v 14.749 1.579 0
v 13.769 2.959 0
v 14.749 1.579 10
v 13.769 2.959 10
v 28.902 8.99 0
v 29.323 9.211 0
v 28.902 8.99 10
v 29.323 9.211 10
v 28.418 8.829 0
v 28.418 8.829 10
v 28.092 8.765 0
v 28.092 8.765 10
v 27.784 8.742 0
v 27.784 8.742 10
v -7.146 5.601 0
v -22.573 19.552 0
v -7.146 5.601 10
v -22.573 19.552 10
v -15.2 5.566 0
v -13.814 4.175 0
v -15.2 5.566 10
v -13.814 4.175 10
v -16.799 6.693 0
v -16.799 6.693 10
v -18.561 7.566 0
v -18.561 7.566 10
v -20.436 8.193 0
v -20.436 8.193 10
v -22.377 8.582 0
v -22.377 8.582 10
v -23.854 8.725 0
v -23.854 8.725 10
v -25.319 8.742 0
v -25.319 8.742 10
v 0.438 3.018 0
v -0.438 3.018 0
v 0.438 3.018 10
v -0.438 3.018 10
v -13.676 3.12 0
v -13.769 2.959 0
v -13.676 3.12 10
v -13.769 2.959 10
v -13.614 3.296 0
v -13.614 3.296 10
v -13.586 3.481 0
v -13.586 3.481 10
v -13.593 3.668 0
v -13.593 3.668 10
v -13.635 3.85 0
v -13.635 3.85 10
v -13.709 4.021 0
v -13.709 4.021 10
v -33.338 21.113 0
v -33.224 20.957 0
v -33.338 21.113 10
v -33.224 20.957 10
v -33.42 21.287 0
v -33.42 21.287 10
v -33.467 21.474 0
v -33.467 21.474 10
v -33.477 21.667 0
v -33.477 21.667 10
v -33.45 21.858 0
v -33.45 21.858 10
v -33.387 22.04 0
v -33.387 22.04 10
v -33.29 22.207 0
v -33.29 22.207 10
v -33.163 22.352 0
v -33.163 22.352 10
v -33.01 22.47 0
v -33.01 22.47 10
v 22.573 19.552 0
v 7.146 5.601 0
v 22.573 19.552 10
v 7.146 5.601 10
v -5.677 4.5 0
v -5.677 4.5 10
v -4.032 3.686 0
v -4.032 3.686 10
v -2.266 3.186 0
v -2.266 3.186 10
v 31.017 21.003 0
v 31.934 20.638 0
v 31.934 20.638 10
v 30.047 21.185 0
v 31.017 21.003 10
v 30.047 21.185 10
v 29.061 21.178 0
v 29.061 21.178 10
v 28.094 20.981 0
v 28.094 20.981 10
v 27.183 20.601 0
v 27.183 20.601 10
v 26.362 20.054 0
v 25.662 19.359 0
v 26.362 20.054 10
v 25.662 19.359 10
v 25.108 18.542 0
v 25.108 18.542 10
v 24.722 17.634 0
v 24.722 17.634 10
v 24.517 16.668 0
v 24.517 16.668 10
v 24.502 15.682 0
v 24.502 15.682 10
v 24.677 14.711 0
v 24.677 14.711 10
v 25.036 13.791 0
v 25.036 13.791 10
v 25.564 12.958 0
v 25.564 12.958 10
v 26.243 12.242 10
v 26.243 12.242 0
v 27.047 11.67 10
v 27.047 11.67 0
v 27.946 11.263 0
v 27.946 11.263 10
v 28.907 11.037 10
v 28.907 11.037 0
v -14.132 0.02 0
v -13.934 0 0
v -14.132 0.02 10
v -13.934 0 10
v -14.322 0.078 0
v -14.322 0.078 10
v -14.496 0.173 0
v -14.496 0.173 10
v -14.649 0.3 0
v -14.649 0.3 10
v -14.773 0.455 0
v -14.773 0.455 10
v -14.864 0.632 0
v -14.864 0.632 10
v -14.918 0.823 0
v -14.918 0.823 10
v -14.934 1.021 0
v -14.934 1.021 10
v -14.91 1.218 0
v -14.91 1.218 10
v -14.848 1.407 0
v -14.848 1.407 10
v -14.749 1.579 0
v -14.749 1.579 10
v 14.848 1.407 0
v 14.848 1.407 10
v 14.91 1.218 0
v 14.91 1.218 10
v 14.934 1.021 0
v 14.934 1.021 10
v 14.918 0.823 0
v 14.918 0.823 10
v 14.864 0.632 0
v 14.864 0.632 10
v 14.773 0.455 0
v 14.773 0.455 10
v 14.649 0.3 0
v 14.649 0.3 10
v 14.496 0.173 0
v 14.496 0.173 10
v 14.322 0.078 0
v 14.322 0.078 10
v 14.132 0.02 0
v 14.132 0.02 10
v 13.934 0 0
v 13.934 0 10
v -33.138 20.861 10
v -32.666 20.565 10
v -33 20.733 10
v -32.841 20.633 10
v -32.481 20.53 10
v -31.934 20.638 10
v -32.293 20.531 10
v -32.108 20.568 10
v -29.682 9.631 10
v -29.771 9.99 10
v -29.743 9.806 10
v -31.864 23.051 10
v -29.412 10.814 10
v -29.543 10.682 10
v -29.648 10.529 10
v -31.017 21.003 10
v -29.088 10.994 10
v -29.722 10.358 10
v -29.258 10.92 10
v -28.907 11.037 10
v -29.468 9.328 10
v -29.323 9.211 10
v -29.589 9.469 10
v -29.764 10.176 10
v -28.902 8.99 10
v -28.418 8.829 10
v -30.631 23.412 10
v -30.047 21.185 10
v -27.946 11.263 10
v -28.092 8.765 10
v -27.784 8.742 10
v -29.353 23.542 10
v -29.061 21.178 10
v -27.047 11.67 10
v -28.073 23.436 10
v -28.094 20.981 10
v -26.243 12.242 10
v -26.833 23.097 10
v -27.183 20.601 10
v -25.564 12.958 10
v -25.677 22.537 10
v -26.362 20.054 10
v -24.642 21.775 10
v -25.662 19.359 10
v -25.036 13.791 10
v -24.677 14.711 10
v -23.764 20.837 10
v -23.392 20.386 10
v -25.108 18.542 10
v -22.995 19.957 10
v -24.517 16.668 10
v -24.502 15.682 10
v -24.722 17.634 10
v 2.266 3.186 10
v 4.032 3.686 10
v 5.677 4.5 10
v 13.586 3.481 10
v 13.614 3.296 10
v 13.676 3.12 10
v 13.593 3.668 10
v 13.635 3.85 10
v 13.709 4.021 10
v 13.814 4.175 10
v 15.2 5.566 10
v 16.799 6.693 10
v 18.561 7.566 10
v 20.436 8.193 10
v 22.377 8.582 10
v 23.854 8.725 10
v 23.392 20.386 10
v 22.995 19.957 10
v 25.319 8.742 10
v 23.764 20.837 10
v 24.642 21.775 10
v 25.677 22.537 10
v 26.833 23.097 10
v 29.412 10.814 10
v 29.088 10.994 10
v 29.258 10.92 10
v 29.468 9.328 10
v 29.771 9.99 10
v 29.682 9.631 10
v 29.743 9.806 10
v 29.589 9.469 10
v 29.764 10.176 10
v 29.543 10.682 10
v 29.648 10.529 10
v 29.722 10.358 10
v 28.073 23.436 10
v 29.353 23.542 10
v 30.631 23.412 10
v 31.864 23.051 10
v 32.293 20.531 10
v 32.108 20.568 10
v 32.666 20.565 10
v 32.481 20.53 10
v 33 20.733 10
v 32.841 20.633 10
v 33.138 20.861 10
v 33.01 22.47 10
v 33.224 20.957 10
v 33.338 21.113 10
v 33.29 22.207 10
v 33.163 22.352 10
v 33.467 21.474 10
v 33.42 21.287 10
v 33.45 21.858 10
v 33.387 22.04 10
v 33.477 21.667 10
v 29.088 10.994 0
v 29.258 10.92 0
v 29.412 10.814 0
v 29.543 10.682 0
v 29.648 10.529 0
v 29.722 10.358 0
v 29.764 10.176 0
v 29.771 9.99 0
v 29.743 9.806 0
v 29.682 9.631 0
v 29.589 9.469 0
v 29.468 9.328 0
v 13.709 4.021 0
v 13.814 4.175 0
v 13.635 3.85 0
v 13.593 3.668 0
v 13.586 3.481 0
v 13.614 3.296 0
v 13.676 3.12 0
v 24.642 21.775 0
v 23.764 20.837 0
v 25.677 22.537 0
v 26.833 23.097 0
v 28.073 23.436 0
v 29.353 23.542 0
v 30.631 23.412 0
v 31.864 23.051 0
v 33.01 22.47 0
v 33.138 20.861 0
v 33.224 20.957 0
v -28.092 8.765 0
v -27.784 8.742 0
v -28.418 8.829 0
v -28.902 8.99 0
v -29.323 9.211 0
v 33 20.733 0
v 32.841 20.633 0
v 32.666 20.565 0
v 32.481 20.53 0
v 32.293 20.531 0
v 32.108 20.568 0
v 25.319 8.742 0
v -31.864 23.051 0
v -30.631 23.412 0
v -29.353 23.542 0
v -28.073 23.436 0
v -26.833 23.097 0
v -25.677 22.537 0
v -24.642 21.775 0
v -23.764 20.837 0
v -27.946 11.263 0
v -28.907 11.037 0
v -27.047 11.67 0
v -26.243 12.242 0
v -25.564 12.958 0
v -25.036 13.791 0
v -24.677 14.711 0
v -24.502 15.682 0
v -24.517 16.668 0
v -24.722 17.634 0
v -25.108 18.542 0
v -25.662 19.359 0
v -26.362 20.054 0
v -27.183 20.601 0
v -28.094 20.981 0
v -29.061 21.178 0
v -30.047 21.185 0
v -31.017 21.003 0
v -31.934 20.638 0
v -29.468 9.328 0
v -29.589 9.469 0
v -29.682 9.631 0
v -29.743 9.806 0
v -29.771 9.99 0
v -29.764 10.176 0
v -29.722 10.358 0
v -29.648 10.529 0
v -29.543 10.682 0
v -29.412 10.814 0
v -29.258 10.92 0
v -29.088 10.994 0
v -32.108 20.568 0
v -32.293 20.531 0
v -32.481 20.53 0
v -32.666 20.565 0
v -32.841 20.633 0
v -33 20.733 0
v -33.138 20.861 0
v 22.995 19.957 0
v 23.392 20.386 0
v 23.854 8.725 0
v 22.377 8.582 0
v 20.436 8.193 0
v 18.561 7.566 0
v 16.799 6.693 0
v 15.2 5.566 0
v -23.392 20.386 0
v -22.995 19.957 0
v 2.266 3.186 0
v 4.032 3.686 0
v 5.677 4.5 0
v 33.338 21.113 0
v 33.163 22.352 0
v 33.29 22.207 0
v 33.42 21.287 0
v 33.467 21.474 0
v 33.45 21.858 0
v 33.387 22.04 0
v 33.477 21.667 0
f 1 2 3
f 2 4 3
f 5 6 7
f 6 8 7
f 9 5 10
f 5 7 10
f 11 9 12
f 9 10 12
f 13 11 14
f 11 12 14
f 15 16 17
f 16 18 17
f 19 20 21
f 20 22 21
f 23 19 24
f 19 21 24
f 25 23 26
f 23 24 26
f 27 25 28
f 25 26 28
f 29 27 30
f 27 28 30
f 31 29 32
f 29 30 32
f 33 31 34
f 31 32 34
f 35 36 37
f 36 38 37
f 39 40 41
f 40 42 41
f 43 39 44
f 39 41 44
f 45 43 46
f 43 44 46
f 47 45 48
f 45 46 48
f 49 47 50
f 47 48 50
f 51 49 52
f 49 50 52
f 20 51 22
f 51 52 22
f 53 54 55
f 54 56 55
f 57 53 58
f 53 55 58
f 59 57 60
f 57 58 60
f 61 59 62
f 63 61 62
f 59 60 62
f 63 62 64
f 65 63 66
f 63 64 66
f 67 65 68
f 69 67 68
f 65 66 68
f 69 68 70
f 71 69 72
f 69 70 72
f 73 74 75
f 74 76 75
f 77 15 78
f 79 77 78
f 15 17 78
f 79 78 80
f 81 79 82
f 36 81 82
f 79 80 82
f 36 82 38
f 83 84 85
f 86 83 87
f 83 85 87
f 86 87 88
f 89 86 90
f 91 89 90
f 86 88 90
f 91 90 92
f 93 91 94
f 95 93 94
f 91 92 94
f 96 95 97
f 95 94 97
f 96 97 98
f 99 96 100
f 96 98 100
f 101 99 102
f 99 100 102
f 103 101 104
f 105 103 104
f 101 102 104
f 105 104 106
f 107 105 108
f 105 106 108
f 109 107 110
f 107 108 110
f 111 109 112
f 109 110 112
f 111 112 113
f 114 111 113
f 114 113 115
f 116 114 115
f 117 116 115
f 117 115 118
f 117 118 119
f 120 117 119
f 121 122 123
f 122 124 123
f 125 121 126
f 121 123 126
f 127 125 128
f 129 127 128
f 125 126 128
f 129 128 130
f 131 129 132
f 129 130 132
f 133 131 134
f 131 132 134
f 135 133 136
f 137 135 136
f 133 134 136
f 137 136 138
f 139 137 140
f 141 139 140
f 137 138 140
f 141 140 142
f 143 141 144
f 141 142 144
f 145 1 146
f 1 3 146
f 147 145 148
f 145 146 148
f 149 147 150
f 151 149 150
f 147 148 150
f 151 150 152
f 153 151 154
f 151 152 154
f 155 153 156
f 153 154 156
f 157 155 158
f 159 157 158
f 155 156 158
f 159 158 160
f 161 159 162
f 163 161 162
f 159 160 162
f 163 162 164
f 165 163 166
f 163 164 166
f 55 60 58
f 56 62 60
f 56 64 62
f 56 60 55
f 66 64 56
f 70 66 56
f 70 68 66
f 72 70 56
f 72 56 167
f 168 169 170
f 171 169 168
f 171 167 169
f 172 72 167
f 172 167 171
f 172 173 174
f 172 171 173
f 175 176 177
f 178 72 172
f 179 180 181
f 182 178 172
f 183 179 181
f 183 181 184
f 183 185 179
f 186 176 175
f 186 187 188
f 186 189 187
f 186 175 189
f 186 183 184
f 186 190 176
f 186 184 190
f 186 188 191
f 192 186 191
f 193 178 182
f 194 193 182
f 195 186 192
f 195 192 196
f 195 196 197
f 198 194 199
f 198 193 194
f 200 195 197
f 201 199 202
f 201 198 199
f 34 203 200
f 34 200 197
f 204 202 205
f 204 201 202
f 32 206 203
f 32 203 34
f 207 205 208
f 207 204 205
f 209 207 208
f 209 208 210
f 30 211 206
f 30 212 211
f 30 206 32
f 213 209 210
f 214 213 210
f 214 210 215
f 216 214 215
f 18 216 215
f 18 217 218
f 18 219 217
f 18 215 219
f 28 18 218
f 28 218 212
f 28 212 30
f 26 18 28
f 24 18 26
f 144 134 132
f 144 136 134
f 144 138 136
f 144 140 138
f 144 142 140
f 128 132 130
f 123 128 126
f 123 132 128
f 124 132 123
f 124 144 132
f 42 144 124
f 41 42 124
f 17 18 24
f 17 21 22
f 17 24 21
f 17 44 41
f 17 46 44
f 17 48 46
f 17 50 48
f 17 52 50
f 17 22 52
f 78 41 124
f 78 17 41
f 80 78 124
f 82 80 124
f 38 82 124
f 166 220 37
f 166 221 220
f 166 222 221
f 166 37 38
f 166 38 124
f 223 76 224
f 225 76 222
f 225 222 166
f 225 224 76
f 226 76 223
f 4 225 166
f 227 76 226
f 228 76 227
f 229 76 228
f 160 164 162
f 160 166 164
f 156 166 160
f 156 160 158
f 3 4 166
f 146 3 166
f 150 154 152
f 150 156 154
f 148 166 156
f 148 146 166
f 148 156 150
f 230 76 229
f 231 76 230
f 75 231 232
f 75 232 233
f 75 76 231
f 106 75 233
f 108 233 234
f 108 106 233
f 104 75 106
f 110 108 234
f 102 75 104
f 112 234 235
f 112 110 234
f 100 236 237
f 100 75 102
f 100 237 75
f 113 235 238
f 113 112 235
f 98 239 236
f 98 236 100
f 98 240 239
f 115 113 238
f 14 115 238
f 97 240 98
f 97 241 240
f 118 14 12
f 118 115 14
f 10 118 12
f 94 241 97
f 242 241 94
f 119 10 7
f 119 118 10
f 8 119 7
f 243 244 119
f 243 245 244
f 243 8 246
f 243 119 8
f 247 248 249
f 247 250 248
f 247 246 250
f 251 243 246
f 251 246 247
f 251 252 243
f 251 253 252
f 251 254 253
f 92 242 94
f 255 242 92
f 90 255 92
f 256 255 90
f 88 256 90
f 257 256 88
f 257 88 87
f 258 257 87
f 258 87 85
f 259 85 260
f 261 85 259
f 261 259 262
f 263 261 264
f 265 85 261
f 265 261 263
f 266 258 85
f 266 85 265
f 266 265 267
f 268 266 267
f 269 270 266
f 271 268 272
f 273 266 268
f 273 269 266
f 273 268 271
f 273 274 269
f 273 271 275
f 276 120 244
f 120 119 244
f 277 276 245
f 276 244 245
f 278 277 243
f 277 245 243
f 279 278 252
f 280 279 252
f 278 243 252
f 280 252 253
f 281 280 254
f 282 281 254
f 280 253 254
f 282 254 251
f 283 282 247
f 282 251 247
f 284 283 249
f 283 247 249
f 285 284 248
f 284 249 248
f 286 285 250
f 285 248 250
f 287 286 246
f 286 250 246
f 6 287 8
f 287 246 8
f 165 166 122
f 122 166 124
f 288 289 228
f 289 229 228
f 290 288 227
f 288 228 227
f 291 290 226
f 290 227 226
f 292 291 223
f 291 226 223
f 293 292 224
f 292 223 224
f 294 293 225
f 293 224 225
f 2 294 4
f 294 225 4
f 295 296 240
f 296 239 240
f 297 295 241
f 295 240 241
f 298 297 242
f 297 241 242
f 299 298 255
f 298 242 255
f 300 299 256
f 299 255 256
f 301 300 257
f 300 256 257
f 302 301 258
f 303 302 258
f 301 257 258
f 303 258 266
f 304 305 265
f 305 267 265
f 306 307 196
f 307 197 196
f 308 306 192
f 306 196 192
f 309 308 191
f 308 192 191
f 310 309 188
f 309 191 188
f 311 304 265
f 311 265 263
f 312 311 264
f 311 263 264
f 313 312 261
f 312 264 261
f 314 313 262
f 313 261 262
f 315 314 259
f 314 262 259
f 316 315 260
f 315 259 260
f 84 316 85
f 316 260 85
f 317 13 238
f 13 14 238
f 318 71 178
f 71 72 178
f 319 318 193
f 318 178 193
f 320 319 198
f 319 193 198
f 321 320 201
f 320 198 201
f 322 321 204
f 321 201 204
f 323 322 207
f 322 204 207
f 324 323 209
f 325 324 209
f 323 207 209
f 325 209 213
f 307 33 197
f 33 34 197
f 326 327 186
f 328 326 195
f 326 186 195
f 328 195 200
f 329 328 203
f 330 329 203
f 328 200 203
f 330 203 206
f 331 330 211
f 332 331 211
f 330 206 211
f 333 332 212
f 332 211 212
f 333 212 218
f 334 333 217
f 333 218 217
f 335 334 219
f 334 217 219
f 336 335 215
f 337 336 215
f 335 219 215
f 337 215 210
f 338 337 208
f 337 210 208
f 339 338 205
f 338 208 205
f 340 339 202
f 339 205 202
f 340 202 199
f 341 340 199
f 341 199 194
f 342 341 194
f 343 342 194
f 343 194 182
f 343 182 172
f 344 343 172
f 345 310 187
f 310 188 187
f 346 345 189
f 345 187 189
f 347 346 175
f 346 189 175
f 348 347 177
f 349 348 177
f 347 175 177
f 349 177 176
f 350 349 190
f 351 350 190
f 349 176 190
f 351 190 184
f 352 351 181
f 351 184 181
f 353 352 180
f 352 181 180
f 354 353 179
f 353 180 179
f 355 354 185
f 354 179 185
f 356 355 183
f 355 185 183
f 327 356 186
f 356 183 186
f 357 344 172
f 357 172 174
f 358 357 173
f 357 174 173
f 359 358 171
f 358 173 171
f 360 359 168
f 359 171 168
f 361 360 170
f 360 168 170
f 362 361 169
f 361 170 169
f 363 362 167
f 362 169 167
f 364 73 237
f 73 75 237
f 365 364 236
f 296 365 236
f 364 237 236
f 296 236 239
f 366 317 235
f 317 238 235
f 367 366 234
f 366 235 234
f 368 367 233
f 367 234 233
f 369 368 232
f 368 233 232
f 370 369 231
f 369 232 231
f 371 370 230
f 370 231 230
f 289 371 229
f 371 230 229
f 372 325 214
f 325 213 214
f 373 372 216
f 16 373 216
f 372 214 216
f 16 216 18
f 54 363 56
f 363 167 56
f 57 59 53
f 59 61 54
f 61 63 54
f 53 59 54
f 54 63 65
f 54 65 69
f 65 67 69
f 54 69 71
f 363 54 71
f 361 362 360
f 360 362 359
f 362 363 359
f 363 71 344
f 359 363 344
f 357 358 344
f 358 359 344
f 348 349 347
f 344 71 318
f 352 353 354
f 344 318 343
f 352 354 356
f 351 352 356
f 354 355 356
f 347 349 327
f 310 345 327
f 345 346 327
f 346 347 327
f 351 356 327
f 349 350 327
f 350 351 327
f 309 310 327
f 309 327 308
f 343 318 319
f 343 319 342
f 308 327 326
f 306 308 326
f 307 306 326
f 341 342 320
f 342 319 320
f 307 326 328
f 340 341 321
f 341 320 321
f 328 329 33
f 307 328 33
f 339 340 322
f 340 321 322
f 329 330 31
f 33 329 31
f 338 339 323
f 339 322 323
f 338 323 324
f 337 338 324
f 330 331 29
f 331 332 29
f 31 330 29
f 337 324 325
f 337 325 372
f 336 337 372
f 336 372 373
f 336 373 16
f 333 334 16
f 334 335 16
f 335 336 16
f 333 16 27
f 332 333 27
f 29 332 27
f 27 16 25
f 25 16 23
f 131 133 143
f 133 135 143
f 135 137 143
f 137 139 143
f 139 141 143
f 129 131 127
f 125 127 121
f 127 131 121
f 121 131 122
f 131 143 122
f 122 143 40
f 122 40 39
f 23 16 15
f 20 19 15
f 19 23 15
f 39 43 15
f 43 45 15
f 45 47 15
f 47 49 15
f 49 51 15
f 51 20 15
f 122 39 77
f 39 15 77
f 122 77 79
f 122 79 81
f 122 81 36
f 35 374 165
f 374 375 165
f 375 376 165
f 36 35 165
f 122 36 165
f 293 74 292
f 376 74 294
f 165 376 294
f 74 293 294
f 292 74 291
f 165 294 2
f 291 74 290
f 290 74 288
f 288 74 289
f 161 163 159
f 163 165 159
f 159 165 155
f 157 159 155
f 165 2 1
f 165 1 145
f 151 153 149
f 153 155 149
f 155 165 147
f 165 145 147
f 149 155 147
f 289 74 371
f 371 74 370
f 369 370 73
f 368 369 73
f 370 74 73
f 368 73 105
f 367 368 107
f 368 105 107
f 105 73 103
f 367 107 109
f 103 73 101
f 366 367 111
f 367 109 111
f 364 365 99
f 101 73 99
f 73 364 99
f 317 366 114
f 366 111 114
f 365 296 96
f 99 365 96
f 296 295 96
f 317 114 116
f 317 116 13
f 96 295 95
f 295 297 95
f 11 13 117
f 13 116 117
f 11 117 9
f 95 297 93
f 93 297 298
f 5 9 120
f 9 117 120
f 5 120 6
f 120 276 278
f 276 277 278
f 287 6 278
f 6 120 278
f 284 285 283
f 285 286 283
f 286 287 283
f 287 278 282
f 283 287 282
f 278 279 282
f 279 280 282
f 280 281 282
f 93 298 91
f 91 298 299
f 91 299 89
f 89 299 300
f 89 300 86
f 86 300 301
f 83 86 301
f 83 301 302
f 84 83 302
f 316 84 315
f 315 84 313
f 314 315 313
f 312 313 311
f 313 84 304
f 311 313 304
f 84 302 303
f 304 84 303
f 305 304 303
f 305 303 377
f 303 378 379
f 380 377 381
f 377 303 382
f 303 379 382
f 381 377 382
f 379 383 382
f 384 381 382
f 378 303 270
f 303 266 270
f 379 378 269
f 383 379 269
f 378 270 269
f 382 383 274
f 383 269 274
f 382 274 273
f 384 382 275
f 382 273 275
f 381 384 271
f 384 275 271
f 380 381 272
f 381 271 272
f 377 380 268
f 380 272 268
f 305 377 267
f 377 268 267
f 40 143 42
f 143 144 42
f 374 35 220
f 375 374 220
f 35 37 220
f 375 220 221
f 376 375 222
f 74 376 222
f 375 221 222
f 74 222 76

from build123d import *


with BuildPart() as part:
    # Sketch1 → Loft2 section 0
    with BuildSketch(Plane.XY):
        with BuildLine():
            Line((-14.749435925, 1.579146396), (-13.769485327, 2.95855378))
            ThreePointArc((-13.769485327, 2.95855378), (-13.585390404, 3.574613199), (-13.814433877, 4.175412031))
            add(Edge.make_bspline(
                [(-13.814433877, 4.175412031), (-14.417527952, 4.903873153), (-17.567781248, 7.791225194), (-22.06162275, 8.841915434), (-25.318719368, 8.741869045)],
                knots=[0.056598746, 0.056598746, 0.056598746, 0.056598746, 0.264504946, 1, 1, 1, 1], degree=3))
            Line((-25.318719368, 8.741869045), (-27.784310983, 8.741869045))
            add(Edge.make_bspline(
                [(-29.323229714, 9.211162218), (-28.911734347, 8.939401458), (-28.272403474, 8.743384076), (-27.784310983, 8.741869045)],
                knots=[0.586596628, 0.586596628, 0.586596628, 0.586596628, 1, 1, 1, 1], degree=3))
            ThreePointArc((-29.323229714, 9.211162218), (-29.747065132, 10.268151444), (-28.906559125, 11.036534382))
            ThreePointArc((-28.906559125, 11.036534382), (-24.721817141, 17.633736944), (-31.933702711, 20.637709922))
            ThreePointArc((-31.933702711, 20.637709922), (-32.573936169, 20.54323377), (-33.137949221, 20.860588307))
            Line((-33.137949221, 20.860588307), (-33.224181658, 20.957186689))
            ThreePointArc((-33.224181658, 20.957186689), (-33.468334903, 21.763124392), (-33.010324904, 22.46978784))
            ThreePointArc((-33.010324904, 22.46978784), (-28.072687528, 23.43565364), (-23.764465571, 20.837118829))
            ThreePointArc((-23.764465571, 20.837118829), (-23.196744837, 20.168506773), (-22.572618747, 19.552215012))
            Line((-22.572618747, 19.552215012), (-7.145865193, 5.601063972))
            ThreePointArc((-7.145865193, 5.601063972), (-4.032245088, 3.686045747), (-0.43842089, 3.017949499))
            Line((-0.43842089, 3.017949499), (0.43842089, 3.017949499))
            ThreePointArc((0.43842089, 3.017949499), (4.032245088, 3.686045747), (7.145865193, 5.601063972))
            Line((7.145865193, 5.601063972), (22.572618747, 19.552215012))
            ThreePointArc((22.572618747, 19.552215012), (23.196744837, 20.168506773), (23.764465571, 20.837118829))
            ThreePointArc((23.764465571, 20.837118829), (28.072687528, 23.43565364), (33.010324904, 22.46978784))
            ThreePointArc((33.010324904, 22.46978784), (33.468334903, 21.763124392), (33.224181658, 20.957186689))
            Line((33.224181658, 20.957186689), (33.137949221, 20.860588307))
            ThreePointArc((33.137949221, 20.860588307), (32.573936169, 20.54323377), (31.933702711, 20.637709922))
            ThreePointArc((31.933702711, 20.637709922), (24.721817141, 17.633736944), (28.906559125, 11.036534382))
            ThreePointArc((28.906559125, 11.036534382), (29.747065132, 10.268151444), (29.323229714, 9.211162218))
            add(Edge.make_bspline(
                [(29.323229714, 9.211162218), (28.911734347, 8.939401458), (28.272403474, 8.743384076), (27.784310983, 8.741869045)],
                knots=[0.586596628, 0.586596628, 0.586596628, 0.586596628, 1, 1, 1, 1], degree=3))
            Line((27.784310983, 8.741869045), (25.318719368, 8.741869045))
            add(Edge.make_bspline(
                [(13.814433877, 4.175412031), (14.417527952, 4.903873153), (17.567781248, 7.791225194), (22.06162275, 8.841915434), (25.318719368, 8.741869045)],
                knots=[0.056598746, 0.056598746, 0.056598746, 0.056598746, 0.264504946, 1, 1, 1, 1], degree=3))
            ThreePointArc((13.814433877, 4.175412031), (13.585390404, 3.574613199), (13.769485327, 2.95855378))
            Line((13.769485327, 2.95855378), (14.749435925, 1.579146396))
            ThreePointArc((14.749435925, 1.579146396), (14.822791679, 0.541276988), (13.934212365, 0))
            Line((13.934212365, 0), (-13.934212365, 0))
            ThreePointArc((-13.934212365, 0), (-14.822791679, 0.541276988), (-14.749435925, 1.579146396))
        make_face()
    # Sketch7 → Loft2 section 1
    with BuildSketch(Plane.XY.offset(10)):
        with BuildLine():
            Line((-14.749435925, 1.579146396), (-13.769485327, 2.95855378))
            ThreePointArc((-13.769485327, 2.95855378), (-13.585390404, 3.574613199), (-13.814433877, 4.175412031))
            add(Edge.make_bspline(
                [(-13.814433877, 4.175412031), (-14.417527952, 4.903873153), (-17.567781248, 7.791225194), (-22.06162275, 8.841915434), (-25.318719368, 8.741869045)],
                knots=[0.056598746, 0.056598746, 0.056598746, 0.056598746, 0.264504946, 1, 1, 1, 1], degree=3))
            Line((-25.318719368, 8.741869045), (-27.784310983, 8.741869045))
            add(Edge.make_bspline(
                [(-29.323229714, 9.211162218), (-28.911734347, 8.939401458), (-28.272403474, 8.743384076), (-27.784310983, 8.741869045)],
                knots=[0.586596628, 0.586596628, 0.586596628, 0.586596628, 1, 1, 1, 1], degree=3))
            ThreePointArc((-29.323229714, 9.211162218), (-29.747065132, 10.268151444), (-28.906559125, 11.036534382))
            ThreePointArc((-28.906559125, 11.036534382), (-24.721817141, 17.633736944), (-31.933702711, 20.637709922))
            ThreePointArc((-31.933702711, 20.637709922), (-32.573936169, 20.54323377), (-33.137949221, 20.860588307))
            Line((-33.137949221, 20.860588307), (-33.224181658, 20.957186689))
            ThreePointArc((-33.224181658, 20.957186689), (-33.468334903, 21.763124392), (-33.010324904, 22.46978784))
            ThreePointArc((-33.010324904, 22.46978784), (-28.072687528, 23.43565364), (-23.764465571, 20.837118829))
            ThreePointArc((-23.764465571, 20.837118829), (-23.196744837, 20.168506773), (-22.572618747, 19.552215012))
            Line((-22.572618747, 19.552215012), (-7.145865193, 5.601063972))
            ThreePointArc((-7.145865193, 5.601063972), (-4.032245088, 3.686045747), (-0.43842089, 3.017949499))
            Line((-0.43842089, 3.017949499), (0.43842089, 3.017949499))
            ThreePointArc((0.43842089, 3.017949499), (4.032245088, 3.686045747), (7.145865193, 5.601063972))
            Line((7.145865193, 5.601063972), (22.572618747, 19.552215012))
            ThreePointArc((22.572618747, 19.552215012), (23.196744837, 20.168506773), (23.764465571, 20.837118829))
            ThreePointArc((23.764465571, 20.837118829), (28.072687528, 23.43565364), (33.010324904, 22.46978784))
            ThreePointArc((33.010324904, 22.46978784), (33.468334903, 21.763124392), (33.224181658, 20.957186689))
            Line((33.224181658, 20.957186689), (33.137949221, 20.860588307))
            ThreePointArc((33.137949221, 20.860588307), (32.573936169, 20.54323377), (31.933702711, 20.637709922))
            ThreePointArc((31.933702711, 20.637709922), (24.721817141, 17.633736944), (28.906559125, 11.036534382))
            ThreePointArc((28.906559125, 11.036534382), (29.747065132, 10.268151444), (29.323229714, 9.211162218))
            add(Edge.make_bspline(
                [(29.323229714, 9.211162218), (28.911734347, 8.939401458), (28.272403474, 8.743384076), (27.784310983, 8.741869045)],
                knots=[0.586596628, 0.586596628, 0.586596628, 0.586596628, 1, 1, 1, 1], degree=3))
            Line((27.784310983, 8.741869045), (25.318719368, 8.741869045))
            add(Edge.make_bspline(
                [(13.814433877, 4.175412031), (14.417527952, 4.903873153), (17.567781248, 7.791225194), (22.06162275, 8.841915434), (25.318719368, 8.741869045)],
                knots=[0.056598746, 0.056598746, 0.056598746, 0.056598746, 0.264504946, 1, 1, 1, 1], degree=3))
            ThreePointArc((13.814433877, 4.175412031), (13.585390404, 3.574613199), (13.769485327, 2.95855378))
            Line((13.769485327, 2.95855378), (14.749435925, 1.579146396))
            ThreePointArc((14.749435925, 1.579146396), (14.822791679, 0.541276988), (13.934212365, 0))
            Line((13.934212365, 0), (-13.934212365, 0))
            ThreePointArc((-13.934212365, 0), (-14.822791679, 0.541276988), (-14.749435925, 1.579146396))
        make_face()
    loft()


solid = part.part
